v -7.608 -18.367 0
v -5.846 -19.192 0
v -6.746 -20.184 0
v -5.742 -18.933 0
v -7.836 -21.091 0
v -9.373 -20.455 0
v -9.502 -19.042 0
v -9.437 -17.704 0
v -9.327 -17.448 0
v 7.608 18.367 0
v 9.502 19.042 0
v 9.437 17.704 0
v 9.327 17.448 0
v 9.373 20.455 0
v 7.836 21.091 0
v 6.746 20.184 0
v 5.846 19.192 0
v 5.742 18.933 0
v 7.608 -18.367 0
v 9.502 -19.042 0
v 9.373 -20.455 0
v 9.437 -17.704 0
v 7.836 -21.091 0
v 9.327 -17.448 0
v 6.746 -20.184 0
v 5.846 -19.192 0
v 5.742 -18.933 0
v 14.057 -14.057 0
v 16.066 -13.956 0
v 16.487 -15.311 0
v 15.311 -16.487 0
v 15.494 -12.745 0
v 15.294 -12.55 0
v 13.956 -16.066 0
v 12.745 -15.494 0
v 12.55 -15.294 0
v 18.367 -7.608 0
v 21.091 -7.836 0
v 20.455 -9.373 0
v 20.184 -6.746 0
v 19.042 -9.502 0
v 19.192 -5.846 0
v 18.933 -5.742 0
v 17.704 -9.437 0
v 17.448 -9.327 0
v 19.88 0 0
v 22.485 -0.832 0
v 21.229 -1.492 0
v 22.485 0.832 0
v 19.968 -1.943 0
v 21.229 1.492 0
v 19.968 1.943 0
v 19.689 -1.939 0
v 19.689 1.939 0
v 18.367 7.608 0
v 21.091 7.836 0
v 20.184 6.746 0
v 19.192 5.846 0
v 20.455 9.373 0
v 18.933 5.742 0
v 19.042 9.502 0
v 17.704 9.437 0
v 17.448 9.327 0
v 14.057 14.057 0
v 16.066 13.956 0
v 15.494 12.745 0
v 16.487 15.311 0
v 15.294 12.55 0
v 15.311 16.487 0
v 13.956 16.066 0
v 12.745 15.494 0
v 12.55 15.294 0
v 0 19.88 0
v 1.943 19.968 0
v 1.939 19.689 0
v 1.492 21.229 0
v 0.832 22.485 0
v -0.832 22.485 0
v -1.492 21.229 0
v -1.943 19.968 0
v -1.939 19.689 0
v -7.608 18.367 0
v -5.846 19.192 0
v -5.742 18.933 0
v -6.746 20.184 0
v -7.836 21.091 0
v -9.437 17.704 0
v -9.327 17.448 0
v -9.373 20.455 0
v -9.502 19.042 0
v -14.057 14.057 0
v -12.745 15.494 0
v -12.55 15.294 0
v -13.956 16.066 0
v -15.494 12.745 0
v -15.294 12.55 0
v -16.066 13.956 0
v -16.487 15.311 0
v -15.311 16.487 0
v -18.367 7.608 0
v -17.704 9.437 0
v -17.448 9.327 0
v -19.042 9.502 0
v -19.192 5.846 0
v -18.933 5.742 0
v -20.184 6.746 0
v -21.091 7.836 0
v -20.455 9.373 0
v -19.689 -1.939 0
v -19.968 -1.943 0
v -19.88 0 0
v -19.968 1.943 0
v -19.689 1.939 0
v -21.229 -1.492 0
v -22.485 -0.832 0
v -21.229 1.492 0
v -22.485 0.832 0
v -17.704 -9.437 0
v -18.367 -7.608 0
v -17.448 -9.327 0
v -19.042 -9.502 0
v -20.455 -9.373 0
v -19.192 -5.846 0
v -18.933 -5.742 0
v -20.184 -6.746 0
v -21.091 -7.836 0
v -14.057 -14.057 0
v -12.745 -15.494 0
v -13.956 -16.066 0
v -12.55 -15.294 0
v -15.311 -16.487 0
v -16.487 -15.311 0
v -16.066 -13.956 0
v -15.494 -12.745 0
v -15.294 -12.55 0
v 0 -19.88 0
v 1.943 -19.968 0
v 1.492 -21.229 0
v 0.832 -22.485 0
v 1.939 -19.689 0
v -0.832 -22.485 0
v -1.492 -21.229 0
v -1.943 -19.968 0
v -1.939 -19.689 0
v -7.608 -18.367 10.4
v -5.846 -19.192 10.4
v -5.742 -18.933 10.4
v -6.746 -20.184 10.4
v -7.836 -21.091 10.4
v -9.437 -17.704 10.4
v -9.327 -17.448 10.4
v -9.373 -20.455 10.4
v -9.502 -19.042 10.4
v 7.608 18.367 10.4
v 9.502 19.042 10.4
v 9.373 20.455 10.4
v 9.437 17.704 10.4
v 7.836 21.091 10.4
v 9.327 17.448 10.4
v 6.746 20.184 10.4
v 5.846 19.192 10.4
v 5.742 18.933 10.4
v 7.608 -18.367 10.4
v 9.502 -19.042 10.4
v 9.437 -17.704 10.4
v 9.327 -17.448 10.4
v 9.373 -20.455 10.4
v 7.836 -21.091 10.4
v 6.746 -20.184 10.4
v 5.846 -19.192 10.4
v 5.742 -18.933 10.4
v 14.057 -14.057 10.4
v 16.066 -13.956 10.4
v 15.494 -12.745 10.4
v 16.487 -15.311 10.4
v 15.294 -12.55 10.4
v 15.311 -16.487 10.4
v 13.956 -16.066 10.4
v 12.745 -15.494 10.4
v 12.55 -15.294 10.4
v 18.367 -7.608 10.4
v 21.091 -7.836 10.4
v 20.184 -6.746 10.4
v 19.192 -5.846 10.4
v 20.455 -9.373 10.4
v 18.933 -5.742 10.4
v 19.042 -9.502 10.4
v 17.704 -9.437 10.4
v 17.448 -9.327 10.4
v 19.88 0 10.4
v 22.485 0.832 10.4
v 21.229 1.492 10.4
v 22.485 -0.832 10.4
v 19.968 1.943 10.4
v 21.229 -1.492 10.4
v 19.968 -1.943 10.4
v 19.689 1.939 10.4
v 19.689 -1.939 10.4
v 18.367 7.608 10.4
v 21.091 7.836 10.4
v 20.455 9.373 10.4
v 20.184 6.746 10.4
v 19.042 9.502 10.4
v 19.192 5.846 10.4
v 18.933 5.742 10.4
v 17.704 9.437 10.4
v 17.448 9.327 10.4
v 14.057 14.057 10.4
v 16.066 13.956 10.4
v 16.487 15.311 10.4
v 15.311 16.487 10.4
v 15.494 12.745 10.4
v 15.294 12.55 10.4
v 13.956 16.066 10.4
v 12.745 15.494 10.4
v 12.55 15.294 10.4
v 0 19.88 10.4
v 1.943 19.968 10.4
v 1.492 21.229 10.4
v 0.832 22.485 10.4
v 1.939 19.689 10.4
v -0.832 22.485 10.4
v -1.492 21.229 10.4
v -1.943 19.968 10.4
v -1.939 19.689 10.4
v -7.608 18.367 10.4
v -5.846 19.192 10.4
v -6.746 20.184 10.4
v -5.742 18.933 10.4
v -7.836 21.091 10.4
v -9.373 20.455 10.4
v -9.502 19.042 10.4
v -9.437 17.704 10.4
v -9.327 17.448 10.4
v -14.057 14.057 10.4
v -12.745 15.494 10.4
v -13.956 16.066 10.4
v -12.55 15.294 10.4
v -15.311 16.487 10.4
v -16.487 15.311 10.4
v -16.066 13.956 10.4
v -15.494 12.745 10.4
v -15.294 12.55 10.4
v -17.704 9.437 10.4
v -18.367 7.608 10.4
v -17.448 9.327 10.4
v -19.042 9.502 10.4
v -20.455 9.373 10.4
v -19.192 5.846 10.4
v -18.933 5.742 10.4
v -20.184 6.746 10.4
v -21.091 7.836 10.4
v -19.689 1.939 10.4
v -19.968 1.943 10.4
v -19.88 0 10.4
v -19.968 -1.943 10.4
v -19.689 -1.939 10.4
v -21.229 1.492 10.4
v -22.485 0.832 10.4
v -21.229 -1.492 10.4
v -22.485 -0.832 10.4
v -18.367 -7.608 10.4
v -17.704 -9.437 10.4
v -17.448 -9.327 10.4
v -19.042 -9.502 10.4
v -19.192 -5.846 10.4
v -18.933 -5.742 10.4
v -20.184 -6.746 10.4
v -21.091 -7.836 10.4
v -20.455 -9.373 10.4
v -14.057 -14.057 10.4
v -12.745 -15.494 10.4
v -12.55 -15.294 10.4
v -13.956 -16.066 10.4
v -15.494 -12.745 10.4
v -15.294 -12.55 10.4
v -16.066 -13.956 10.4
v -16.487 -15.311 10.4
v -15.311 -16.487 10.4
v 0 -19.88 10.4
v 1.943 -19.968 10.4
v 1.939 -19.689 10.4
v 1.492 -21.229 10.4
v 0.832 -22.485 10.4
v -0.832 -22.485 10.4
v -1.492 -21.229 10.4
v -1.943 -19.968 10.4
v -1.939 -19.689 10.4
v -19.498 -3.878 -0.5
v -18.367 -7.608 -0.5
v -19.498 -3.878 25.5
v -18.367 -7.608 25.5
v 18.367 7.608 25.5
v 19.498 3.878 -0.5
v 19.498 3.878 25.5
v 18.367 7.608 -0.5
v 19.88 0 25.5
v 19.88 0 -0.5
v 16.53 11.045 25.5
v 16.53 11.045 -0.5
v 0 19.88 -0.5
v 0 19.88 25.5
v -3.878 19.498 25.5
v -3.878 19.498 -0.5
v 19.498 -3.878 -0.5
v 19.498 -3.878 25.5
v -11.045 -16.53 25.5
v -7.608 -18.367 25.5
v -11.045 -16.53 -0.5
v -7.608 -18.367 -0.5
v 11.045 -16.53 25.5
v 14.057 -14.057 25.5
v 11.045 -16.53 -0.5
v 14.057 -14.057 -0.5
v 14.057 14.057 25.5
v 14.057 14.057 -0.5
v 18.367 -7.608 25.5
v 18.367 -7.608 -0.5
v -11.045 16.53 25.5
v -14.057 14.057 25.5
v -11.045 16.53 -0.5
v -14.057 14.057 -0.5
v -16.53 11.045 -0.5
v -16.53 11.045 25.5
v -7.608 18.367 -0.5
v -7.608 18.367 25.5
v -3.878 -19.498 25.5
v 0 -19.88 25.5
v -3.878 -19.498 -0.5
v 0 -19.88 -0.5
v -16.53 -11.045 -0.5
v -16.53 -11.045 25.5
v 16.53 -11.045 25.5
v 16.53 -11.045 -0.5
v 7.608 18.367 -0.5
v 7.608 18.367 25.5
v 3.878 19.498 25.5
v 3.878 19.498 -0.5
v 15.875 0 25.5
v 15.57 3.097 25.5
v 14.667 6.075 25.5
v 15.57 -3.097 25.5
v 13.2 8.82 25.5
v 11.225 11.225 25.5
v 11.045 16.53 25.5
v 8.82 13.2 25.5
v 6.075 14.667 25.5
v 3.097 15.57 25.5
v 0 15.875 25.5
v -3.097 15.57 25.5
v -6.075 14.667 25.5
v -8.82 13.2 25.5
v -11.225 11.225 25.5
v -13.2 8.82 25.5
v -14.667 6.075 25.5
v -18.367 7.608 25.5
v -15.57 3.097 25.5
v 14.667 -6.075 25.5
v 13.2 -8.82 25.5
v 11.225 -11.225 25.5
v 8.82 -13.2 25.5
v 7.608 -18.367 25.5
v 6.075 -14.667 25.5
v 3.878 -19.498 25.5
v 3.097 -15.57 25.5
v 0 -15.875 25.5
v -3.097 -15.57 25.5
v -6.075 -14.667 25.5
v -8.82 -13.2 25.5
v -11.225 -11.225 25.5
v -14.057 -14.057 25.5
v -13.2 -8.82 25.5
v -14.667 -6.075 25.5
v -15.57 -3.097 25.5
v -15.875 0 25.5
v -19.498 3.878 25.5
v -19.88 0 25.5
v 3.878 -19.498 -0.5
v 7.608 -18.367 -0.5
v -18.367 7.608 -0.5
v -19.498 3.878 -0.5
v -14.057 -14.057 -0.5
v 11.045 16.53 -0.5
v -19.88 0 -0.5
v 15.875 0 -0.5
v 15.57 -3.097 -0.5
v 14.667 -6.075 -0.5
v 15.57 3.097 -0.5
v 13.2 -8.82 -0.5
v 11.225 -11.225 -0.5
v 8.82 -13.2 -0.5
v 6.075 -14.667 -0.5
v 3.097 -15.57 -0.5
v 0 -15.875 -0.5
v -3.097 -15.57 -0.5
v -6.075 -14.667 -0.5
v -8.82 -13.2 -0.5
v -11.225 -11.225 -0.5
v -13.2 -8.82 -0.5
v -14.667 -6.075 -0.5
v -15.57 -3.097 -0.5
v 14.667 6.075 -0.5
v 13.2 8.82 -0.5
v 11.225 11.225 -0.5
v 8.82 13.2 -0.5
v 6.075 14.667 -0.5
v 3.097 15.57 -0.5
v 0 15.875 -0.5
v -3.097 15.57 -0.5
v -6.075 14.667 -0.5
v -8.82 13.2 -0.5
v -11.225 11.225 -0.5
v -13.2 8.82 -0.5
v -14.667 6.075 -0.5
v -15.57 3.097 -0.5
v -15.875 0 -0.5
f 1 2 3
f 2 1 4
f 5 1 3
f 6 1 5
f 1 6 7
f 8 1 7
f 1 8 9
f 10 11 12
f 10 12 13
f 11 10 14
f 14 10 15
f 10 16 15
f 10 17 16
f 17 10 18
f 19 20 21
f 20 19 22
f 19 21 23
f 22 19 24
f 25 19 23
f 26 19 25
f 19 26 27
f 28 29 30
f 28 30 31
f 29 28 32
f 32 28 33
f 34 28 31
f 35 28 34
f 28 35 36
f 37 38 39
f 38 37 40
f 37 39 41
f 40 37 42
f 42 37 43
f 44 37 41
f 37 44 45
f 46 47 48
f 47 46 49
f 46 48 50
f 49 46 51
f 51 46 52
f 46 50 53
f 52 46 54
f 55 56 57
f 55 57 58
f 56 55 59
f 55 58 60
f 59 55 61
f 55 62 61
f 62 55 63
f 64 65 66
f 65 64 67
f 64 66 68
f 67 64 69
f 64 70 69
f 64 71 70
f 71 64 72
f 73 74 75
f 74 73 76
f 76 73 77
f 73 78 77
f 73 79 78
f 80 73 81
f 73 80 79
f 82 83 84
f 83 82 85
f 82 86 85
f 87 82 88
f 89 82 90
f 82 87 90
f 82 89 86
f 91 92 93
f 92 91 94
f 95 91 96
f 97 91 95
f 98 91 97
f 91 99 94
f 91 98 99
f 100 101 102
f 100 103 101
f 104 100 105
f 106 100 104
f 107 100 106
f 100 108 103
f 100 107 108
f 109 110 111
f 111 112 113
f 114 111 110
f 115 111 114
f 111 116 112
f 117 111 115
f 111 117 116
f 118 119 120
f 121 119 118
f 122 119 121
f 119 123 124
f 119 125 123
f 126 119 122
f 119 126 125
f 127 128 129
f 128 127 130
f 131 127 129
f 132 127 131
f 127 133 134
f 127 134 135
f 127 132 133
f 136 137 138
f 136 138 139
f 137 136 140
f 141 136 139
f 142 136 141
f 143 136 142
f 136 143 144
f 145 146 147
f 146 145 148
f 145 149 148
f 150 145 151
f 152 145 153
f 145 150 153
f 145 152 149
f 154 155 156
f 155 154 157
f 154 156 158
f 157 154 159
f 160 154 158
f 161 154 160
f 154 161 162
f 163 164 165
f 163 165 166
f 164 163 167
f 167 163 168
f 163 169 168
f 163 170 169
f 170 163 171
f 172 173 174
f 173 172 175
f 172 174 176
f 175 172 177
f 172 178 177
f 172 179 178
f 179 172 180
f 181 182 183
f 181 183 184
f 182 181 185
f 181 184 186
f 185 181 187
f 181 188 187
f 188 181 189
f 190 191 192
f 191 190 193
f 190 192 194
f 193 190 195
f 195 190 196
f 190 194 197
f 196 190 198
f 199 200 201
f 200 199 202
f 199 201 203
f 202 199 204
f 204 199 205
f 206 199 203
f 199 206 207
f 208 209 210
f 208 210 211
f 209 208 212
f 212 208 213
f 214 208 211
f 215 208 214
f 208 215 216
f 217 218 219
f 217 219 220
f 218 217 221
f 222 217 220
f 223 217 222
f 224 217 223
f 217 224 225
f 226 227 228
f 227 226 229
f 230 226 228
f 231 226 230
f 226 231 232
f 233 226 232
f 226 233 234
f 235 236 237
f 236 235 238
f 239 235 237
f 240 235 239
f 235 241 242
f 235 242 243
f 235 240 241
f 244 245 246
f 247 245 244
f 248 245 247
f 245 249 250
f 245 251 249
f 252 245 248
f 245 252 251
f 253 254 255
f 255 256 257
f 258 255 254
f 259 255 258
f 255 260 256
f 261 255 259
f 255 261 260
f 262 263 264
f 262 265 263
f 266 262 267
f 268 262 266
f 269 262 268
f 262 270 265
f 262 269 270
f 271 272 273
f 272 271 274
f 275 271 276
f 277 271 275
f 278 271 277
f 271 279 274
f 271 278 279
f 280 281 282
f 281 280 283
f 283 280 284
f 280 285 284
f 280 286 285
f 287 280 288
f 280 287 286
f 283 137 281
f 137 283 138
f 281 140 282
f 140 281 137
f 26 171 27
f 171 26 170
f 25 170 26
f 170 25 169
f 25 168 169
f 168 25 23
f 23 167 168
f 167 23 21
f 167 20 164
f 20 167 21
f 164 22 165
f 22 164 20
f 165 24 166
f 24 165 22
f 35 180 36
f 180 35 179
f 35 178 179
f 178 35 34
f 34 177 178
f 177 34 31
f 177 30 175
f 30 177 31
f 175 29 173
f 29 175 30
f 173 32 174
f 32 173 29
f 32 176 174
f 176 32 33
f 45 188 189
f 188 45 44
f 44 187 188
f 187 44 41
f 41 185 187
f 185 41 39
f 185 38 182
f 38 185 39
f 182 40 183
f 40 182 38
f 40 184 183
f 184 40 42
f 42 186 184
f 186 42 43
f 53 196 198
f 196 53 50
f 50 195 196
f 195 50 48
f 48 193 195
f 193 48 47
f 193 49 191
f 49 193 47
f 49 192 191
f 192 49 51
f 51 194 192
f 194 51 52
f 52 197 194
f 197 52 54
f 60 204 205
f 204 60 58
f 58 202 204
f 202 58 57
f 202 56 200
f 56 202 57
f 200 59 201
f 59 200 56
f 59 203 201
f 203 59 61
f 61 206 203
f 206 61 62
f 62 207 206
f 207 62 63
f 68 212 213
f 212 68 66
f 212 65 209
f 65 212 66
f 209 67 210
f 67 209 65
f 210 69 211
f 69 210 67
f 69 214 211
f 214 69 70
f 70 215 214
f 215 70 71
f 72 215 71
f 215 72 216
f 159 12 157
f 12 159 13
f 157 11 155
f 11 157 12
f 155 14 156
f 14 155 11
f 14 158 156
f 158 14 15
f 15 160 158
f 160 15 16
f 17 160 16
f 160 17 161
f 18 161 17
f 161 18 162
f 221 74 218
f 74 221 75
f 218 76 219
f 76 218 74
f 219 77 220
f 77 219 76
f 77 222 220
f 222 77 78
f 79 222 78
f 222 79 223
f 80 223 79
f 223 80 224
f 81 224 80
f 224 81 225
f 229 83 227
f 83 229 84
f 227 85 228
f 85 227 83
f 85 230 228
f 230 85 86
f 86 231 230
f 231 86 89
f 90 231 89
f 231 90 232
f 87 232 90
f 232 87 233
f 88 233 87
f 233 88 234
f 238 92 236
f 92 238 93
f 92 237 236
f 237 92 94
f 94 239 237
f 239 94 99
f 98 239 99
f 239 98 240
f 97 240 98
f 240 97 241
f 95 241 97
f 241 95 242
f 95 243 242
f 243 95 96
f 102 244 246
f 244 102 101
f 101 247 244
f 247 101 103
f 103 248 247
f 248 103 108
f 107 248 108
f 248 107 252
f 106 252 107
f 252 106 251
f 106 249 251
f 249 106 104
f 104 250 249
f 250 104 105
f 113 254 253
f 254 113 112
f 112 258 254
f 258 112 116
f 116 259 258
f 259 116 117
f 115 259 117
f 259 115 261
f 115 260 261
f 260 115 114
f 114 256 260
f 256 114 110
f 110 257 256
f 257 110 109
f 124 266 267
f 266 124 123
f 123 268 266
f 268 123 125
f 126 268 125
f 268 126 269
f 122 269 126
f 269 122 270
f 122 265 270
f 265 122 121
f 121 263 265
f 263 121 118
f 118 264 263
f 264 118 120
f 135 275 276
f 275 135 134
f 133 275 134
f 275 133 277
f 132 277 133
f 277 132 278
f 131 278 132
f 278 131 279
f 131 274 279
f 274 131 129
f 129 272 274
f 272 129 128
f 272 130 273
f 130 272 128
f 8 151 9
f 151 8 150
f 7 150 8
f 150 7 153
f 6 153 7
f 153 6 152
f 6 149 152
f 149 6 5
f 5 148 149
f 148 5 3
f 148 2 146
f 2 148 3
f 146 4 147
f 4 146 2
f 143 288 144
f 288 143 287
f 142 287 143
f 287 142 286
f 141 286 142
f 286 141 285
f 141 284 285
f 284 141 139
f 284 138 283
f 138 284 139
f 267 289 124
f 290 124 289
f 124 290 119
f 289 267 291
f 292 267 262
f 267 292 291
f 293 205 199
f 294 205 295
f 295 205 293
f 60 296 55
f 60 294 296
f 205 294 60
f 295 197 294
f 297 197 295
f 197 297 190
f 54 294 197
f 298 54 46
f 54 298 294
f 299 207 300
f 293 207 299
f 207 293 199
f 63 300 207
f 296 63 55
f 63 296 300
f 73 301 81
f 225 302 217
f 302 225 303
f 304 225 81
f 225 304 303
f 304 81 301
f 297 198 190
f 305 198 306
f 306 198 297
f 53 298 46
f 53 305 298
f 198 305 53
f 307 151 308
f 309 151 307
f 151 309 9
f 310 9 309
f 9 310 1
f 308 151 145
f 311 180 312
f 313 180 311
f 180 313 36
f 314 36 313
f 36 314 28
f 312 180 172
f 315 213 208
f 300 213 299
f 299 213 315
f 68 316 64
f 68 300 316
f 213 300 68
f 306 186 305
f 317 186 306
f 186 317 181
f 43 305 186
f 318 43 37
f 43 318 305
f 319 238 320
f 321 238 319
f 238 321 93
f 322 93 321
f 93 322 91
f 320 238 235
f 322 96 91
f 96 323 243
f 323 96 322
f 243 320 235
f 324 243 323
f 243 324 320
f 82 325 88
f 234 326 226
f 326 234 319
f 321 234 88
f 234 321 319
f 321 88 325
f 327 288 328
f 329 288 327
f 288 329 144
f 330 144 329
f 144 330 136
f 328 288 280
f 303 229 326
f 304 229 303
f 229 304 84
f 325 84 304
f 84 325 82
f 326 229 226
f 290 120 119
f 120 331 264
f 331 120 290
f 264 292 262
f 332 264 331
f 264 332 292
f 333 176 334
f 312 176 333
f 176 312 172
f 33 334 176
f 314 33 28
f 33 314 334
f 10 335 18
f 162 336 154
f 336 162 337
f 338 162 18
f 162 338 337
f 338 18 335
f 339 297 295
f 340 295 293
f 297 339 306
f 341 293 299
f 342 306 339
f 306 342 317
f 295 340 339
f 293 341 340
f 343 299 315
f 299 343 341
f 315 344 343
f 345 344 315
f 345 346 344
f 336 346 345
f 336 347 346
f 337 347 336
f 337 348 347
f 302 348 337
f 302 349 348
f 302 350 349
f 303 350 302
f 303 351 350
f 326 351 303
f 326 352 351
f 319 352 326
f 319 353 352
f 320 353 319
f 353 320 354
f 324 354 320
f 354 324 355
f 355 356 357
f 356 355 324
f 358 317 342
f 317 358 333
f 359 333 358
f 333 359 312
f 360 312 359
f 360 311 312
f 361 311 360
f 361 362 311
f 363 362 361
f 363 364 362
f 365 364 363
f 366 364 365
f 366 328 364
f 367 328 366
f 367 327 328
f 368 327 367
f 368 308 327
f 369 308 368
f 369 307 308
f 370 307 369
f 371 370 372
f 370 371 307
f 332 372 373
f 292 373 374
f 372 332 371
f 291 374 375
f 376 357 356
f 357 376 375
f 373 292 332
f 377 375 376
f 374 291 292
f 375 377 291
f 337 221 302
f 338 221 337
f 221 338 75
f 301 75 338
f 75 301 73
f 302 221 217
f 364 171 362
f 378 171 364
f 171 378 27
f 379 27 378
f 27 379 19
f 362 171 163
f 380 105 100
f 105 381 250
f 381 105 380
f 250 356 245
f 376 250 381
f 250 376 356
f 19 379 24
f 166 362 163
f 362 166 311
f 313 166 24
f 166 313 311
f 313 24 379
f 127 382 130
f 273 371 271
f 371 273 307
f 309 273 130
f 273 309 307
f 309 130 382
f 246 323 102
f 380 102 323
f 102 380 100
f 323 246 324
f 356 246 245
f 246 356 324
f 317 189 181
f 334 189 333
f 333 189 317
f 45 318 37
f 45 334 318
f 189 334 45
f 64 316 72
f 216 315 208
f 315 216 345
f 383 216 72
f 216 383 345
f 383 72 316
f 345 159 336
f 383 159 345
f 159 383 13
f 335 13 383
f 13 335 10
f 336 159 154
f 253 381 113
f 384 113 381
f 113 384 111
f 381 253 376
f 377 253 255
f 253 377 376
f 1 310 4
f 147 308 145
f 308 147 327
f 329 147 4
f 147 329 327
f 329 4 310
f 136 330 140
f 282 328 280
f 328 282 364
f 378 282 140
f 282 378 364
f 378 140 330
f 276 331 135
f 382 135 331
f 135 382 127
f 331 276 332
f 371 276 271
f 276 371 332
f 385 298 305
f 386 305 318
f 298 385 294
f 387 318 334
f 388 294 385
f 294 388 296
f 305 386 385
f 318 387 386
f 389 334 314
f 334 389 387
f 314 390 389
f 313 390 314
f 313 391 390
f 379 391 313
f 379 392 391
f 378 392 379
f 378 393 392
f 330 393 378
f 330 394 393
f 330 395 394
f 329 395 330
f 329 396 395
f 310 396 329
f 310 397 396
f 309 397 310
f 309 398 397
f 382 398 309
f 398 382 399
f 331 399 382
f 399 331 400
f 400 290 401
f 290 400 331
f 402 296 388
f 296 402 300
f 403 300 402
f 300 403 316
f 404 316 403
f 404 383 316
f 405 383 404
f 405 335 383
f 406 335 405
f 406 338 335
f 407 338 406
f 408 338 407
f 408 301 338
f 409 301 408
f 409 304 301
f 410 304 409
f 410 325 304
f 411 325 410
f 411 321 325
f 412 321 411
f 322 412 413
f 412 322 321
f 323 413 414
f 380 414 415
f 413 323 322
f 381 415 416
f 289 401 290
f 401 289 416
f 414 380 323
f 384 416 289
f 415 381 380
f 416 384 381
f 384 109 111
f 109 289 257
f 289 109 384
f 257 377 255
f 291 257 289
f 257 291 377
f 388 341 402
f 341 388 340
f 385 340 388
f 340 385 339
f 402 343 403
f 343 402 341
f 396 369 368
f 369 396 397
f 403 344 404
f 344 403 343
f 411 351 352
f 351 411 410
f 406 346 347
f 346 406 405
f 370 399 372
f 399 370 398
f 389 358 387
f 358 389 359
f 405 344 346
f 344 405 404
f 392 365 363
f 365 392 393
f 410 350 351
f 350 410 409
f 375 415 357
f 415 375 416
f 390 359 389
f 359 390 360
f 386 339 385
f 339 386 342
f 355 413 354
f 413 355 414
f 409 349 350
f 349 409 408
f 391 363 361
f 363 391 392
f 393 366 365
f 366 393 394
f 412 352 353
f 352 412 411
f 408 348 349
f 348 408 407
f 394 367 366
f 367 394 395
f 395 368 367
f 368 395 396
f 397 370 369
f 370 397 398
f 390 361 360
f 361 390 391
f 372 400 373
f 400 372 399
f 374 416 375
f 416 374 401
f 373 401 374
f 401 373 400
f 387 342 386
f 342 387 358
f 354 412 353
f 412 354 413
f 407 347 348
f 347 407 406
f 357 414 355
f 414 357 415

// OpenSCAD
$fn = 32;

// ----------------------------------------------------------------------
// Two-module gear rim: z16 m2.5 and z20 m1.75, 25 mm wide
// ----------------------------------------------------------------------

// --- parameters (mm) ---
module_a = 2.5;           // first tooth module
teeth_a = 16;             // first band tooth count
module_b = 1.75;          // second tooth module
teeth_b = 20;             // second band tooth count
band_h = 10;              // height of one tooth band
web_t = 5;                // web thickness between the bands
total = 25;               // overall width over both bands
root_r = 16.88;           // root radius of the coarse band
hub_r = 19.88;            // hub radius
bore_d = 31.75;           // hub bore
hole_count = 4;           // lightening holes
hole_r = 12.66;           // lightening hole circle radius
hole_d = 4;               // lightening hole diameter

band_a = [[16.767, -1.902], [19.968, -1.943], [21.229, -1.492], [22.485, -0.832], [22.485, 0.832], [21.229, 1.492], [19.968, 1.943], [16.767, 1.902], [16.219, 4.659], [19.192, 5.846], [20.184, 6.746], [21.091, 7.836], [20.455, 9.373], [19.042, 9.502], [17.704, 9.437], [14.763, 8.174], [13.201, 10.511], [15.494, 12.745], [16.066, 13.956], [16.487, 15.311], [15.311, 16.487], [13.956, 16.066], [12.745, 15.494], [10.511, 13.201], [8.174, 14.763], [9.437, 17.704], [9.502, 19.042], [9.373, 20.455], [7.836, 21.091], [6.746, 20.184], [5.846, 19.192], [4.659, 16.219], [1.902, 16.767], [1.943, 19.968], [1.492, 21.229], [0.832, 22.485], [-0.832, 22.485], [-1.492, 21.229], [-1.943, 19.968], [-1.902, 16.767], [-4.659, 16.219], [-5.846, 19.192], [-6.746, 20.184], [-7.836, 21.091], [-9.373, 20.455], [-9.502, 19.042], [-9.437, 17.704], [-8.174, 14.763], [-10.511, 13.201], [-12.745, 15.494], [-13.956, 16.066], [-15.311, 16.487], [-16.487, 15.311], [-16.066, 13.956], [-15.494, 12.745], [-13.201, 10.511], [-14.763, 8.174], [-17.704, 9.437], [-19.042, 9.502], [-20.455, 9.373], [-21.091, 7.836], [-20.184, 6.746], [-19.192, 5.846], [-16.219, 4.659], [-16.767, 1.902], [-19.968, 1.943], [-21.229, 1.492], [-22.485, 0.832], [-22.485, -0.832], [-21.229, -1.492], [-19.968, -1.943], [-16.767, -1.902], [-16.219, -4.659], [-19.192, -5.846], [-20.184, -6.746], [-21.091, -7.836], [-20.455, -9.373], [-19.042, -9.502], [-17.704, -9.437], [-14.763, -8.174], [-13.201, -10.511], [-15.494, -12.745], [-16.066, -13.956], [-16.487, -15.311], [-15.311, -16.487], [-13.956, -16.066], [-12.745, -15.494], [-10.511, -13.201], [-8.174, -14.763], [-9.437, -17.704], [-9.502, -19.042], [-9.373, -20.455], [-7.836, -21.091], [-6.746, -20.184], [-5.846, -19.192], [-4.659, -16.219], [-1.902, -16.767], [-1.943, -19.968], [-1.492, -21.229], [-0.832, -22.485], [0.832, -22.485], [1.492, -21.229], [1.943, -19.968], [1.902, -16.767], [4.659, -16.219], [5.846, -19.192], [6.746, -20.184], [7.836, -21.091], [9.373, -20.455], [9.502, -19.042], [9.437, -17.704], [8.174, -14.763], [10.511, -13.201], [12.745, -15.494], [13.956, -16.066], [15.311, -16.487], [16.487, -15.311], [16.066, -13.956], [15.494, -12.745], [13.201, -10.511], [14.763, -8.174], [17.704, -9.437], [19.042, -9.502], [20.455, -9.373], [21.091, -7.836], [20.184, -6.746], [19.192, -5.846], [16.219, -4.659]];
band_b = [[15.246, -1.426], [17.357, -1.397], [18.3, -1.073], [19.24, -0.608], [19.24, 0.608], [18.3, 1.073], [17.357, 1.397], [15.246, 1.426], [14.941, 3.355], [16.939, 4.035], [17.736, 4.635], [18.487, 5.367], [18.111, 6.524], [17.073, 6.675], [16.076, 6.692], [14.059, 6.068], [13.173, 7.807], [14.863, 9.072], [15.436, 9.889], [15.923, 10.817], [15.208, 11.801], [14.175, 11.624], [13.221, 11.332], [11.496, 10.115], [10.115, 11.496], [11.332, 13.221], [11.624, 14.175], [11.801, 15.208], [10.817, 15.923], [9.889, 15.436], [9.072, 14.863], [7.807, 13.173], [6.068, 14.059], [6.692, 16.076], [6.675, 17.073], [6.524, 18.111], [5.367, 18.487], [4.635, 17.736], [4.035, 16.939], [3.355, 14.941], [1.426, 15.246], [1.397, 17.357], [1.073, 18.3], [0.608, 19.24], [-0.608, 19.24], [-1.073, 18.3], [-1.397, 17.357], [-1.426, 15.246], [-3.355, 14.941], [-4.035, 16.939], [-4.635, 17.736], [-5.367, 18.487], [-6.524, 18.111], [-6.675, 17.073], [-6.692, 16.076], [-6.068, 14.059], [-7.807, 13.173], [-9.072, 14.863], [-9.889, 15.436], [-10.817, 15.923], [-11.801, 15.208], [-11.624, 14.175], [-11.332, 13.221], [-10.115, 11.496], [-11.496, 10.115], [-13.221, 11.332], [-14.175, 11.624], [-15.208, 11.801], [-15.923, 10.817], [-15.436, 9.889], [-14.863, 9.072], [-13.173, 7.807], [-14.059, 6.068], [-16.076, 6.692], [-17.073, 6.675], [-18.111, 6.524], [-18.487, 5.367], [-17.736, 4.635], [-16.939, 4.035], [-14.941, 3.355], [-15.246, 1.426], [-17.357, 1.397], [-18.3, 1.073], [-19.24, 0.608], [-19.24, -0.608], [-18.3, -1.073], [-17.357, -1.397], [-15.246, -1.426], [-14.941, -3.355], [-16.939, -4.035], [-17.736, -4.635], [-18.487, -5.367], [-18.111, -6.524], [-17.073, -6.675], [-16.076, -6.692], [-14.059, -6.068], [-13.173, -7.807], [-14.863, -9.072], [-15.436, -9.889], [-15.923, -10.817], [-15.208, -11.801], [-14.175, -11.624], [-13.221, -11.332], [-11.496, -10.115], [-10.115, -11.496], [-11.332, -13.221], [-11.624, -14.175], [-11.801, -15.208], [-10.817, -15.923], [-9.889, -15.436], [-9.072, -14.863], [-7.807, -13.173], [-6.068, -14.059], [-6.692, -16.076], [-6.675, -17.073], [-6.524, -18.111], [-5.367, -18.487], [-4.635, -17.736], [-4.035, -16.939], [-3.355, -14.941], [-1.426, -15.246], [-1.397, -17.357], [-1.073, -18.3], [-0.608, -19.24], [0.608, -19.24], [1.073, -18.3], [1.397, -17.357], [1.426, -15.246], [3.355, -14.941], [4.035, -16.939], [4.635, -17.736], [5.367, -18.487], [6.524, -18.111], [6.675, -17.073], [6.692, -16.076], [6.068, -14.059], [7.807, -13.173], [9.072, -14.863], [9.889, -15.436], [10.817, -15.923], [11.801, -15.208], [11.624, -14.175], [11.332, -13.221], [10.115, -11.496], [11.496, -10.115], [13.221, -11.332], [14.175, -11.624], [15.208, -11.801], [15.923, -10.817], [15.436, -9.889], [14.863, -9.072], [13.173, -7.807], [14.059, -6.068], [16.076, -6.692], [17.073, -6.675], [18.111, -6.524], [18.487, -5.367], [17.736, -4.635], [16.939, -4.035], [14.941, -3.355]];

difference() {
  union() {
    /* tooth band A, overlapping the web by 0.4 mm */
    linear_extrude(height = band_h + 0.4) polygon(band_a);
    /* web */
    translate([0, 0, band_h - 0.4]) cylinder(h = web_t + 0.8, d = 2 * root_r);
    /* tooth band B */
    translate([0, 0, band_h + web_t]) linear_extrude(height = band_h + 0.4) polygon(band_b);
    /* hub */
    translate([0, 0, -0.5]) cylinder(h = total + 1.0, d = 2 * hub_r);
  }
  /* bore */
  translate([0, 0, -2.5]) cylinder(h = total + 5, d = bore_d);
  /* lightening holes through the web */
  for (i = [0 : hole_count - 1]) {
    a = i * 360 / hole_count;
    translate([hole_r * cos(a), hole_r * sin(a), -2.5]) cylinder(h = total + 5, d = hole_d);
  }
}
